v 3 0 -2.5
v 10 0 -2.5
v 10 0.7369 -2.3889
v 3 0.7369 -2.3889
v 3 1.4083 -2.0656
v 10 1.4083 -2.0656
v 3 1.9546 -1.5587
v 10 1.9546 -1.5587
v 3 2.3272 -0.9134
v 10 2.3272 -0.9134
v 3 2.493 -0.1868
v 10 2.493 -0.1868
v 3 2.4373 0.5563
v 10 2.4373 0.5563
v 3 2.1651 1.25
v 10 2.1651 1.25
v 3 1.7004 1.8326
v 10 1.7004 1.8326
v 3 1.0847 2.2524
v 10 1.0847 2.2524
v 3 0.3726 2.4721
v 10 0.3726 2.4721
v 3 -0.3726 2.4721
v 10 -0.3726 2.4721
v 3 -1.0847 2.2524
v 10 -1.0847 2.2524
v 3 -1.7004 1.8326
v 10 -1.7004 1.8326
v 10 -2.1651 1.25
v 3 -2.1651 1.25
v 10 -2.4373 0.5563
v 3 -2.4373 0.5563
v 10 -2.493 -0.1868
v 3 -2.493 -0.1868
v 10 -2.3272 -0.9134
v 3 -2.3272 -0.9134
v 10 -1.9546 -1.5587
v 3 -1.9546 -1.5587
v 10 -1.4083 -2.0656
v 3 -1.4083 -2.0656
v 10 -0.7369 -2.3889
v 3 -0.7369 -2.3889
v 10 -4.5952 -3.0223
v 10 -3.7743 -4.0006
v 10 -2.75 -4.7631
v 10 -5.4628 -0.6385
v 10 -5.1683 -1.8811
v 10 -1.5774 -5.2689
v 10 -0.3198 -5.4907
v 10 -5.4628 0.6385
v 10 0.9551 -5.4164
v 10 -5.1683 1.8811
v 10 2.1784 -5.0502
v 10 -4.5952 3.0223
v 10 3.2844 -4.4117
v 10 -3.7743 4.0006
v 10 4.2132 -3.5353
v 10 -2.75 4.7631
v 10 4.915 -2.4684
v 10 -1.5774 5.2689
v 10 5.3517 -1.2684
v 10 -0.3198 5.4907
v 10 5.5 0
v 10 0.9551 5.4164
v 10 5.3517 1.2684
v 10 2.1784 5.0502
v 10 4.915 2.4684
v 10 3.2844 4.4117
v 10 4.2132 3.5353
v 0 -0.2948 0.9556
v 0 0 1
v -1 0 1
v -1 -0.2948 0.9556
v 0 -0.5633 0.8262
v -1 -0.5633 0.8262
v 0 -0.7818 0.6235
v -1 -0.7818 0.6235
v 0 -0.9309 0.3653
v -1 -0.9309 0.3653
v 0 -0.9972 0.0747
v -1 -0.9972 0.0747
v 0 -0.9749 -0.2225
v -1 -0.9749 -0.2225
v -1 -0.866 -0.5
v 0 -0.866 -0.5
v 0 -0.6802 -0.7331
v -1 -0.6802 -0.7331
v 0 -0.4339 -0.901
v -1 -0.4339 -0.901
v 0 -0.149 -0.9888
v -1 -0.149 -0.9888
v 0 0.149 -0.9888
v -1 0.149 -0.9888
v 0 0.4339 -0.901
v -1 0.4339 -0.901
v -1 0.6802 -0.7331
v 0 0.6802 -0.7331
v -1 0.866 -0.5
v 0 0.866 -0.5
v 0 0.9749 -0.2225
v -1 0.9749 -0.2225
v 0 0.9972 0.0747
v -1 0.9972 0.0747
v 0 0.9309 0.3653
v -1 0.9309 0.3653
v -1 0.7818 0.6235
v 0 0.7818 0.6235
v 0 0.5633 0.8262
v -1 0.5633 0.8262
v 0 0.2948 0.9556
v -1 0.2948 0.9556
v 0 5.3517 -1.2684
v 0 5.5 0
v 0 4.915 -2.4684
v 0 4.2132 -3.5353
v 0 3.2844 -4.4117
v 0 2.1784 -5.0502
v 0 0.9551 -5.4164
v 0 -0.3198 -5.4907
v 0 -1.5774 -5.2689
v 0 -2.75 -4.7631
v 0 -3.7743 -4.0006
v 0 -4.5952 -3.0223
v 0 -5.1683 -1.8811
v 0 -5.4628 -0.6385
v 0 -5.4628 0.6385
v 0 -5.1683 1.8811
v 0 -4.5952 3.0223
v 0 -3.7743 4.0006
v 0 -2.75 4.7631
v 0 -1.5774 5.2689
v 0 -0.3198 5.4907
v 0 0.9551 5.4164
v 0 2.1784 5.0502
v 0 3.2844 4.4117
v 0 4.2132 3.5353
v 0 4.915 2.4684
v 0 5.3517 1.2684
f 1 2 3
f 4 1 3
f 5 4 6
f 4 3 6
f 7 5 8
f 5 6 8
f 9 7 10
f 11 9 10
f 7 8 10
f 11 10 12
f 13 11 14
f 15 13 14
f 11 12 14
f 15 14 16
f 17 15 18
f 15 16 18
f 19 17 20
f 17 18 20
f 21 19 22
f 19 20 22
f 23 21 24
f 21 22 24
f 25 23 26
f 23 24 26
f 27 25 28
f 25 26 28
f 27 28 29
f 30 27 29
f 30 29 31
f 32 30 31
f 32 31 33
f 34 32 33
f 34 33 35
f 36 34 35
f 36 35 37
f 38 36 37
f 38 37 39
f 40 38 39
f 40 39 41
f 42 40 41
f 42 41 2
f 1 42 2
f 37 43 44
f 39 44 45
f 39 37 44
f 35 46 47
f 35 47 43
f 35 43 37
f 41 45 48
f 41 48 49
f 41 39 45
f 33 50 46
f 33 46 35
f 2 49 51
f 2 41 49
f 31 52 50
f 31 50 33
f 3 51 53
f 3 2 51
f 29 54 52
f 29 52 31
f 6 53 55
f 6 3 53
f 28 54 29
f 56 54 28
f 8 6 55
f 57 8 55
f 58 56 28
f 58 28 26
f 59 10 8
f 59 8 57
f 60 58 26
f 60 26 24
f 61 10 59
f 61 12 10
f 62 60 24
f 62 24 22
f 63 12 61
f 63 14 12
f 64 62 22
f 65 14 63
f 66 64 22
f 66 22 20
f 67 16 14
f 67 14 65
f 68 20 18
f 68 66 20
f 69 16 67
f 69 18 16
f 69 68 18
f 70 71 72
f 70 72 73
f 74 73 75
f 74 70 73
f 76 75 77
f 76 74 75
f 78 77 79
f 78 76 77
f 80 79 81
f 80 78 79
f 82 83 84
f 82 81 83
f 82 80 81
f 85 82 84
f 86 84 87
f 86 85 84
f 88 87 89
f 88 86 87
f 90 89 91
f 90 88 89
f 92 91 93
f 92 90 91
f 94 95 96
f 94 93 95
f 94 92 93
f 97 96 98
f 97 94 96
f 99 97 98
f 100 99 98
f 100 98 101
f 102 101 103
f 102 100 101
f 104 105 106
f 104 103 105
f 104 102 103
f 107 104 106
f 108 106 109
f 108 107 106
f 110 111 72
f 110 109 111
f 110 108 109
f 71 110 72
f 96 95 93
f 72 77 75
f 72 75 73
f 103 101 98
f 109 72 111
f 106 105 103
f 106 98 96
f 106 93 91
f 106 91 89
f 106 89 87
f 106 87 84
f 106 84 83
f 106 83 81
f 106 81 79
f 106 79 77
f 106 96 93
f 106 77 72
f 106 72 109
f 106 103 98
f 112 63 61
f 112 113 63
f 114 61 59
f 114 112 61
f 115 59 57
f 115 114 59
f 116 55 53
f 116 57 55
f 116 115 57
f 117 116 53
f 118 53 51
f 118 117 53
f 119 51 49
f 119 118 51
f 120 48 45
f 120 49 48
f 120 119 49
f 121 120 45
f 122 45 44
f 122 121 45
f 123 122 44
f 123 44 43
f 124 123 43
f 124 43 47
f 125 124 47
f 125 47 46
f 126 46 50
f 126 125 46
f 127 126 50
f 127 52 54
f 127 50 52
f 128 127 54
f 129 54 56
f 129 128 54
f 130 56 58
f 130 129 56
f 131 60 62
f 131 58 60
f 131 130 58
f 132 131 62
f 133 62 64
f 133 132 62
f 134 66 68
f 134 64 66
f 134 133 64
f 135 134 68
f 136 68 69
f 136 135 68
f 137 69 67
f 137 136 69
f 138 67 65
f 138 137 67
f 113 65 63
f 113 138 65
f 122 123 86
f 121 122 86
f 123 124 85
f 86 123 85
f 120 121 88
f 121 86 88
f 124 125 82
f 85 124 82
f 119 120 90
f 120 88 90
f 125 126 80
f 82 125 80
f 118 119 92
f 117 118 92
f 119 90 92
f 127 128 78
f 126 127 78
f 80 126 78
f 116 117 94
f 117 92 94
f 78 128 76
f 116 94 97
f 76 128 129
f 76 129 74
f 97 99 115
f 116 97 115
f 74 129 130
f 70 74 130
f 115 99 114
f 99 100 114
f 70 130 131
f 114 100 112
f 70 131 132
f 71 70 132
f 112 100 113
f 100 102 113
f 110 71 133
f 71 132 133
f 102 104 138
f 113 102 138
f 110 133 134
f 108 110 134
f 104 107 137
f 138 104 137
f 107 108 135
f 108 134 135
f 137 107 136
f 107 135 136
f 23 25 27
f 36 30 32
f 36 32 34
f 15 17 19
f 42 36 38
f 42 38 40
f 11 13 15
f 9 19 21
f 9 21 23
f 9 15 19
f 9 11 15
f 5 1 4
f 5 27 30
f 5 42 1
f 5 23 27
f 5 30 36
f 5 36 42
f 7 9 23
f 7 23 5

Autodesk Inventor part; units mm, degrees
ref_plane "YZ Plane" through (0, 0, 0) normal (1, 0, 0) x (0, 1, 0)
ref_plane "XZ Plane" through (0, 0, 0) normal (0, 1, 0) x (-1, 0, 0)
ref_plane "XY Plane" through (0, 0, 0) normal (0, 0, 1) x (1, 0, 0)
sketch "Эскиз1" plane through (0, 0, 0) normal (1, 0, 0) x (0, 1, 0)
  circle A0 centre (0, 0) radius 5.5
  dimension "d0" = 11
extrude "Выдавливание1" add sketch "Эскиз1" along normal blind 10
sketch "Эскиз2" plane through (10, 0, 0) normal (1, 0, 0) x (0, 0, -1)
  circle A0 centre (0, 0) radius 2.5
  dimension "d3" = 5
extrude "Выдавливание2" cut sketch "Эскиз2" against normal blind 7
sketch "Эскиз3" plane through (0, 0, 0) normal (-1, 0, 0) x (0, 0, 1)
  circle A0 centre (0, 0) radius 1
  dimension "d6" = 2
extrude "Выдавливание3" add sketch "Эскиз3" along normal blind 1
